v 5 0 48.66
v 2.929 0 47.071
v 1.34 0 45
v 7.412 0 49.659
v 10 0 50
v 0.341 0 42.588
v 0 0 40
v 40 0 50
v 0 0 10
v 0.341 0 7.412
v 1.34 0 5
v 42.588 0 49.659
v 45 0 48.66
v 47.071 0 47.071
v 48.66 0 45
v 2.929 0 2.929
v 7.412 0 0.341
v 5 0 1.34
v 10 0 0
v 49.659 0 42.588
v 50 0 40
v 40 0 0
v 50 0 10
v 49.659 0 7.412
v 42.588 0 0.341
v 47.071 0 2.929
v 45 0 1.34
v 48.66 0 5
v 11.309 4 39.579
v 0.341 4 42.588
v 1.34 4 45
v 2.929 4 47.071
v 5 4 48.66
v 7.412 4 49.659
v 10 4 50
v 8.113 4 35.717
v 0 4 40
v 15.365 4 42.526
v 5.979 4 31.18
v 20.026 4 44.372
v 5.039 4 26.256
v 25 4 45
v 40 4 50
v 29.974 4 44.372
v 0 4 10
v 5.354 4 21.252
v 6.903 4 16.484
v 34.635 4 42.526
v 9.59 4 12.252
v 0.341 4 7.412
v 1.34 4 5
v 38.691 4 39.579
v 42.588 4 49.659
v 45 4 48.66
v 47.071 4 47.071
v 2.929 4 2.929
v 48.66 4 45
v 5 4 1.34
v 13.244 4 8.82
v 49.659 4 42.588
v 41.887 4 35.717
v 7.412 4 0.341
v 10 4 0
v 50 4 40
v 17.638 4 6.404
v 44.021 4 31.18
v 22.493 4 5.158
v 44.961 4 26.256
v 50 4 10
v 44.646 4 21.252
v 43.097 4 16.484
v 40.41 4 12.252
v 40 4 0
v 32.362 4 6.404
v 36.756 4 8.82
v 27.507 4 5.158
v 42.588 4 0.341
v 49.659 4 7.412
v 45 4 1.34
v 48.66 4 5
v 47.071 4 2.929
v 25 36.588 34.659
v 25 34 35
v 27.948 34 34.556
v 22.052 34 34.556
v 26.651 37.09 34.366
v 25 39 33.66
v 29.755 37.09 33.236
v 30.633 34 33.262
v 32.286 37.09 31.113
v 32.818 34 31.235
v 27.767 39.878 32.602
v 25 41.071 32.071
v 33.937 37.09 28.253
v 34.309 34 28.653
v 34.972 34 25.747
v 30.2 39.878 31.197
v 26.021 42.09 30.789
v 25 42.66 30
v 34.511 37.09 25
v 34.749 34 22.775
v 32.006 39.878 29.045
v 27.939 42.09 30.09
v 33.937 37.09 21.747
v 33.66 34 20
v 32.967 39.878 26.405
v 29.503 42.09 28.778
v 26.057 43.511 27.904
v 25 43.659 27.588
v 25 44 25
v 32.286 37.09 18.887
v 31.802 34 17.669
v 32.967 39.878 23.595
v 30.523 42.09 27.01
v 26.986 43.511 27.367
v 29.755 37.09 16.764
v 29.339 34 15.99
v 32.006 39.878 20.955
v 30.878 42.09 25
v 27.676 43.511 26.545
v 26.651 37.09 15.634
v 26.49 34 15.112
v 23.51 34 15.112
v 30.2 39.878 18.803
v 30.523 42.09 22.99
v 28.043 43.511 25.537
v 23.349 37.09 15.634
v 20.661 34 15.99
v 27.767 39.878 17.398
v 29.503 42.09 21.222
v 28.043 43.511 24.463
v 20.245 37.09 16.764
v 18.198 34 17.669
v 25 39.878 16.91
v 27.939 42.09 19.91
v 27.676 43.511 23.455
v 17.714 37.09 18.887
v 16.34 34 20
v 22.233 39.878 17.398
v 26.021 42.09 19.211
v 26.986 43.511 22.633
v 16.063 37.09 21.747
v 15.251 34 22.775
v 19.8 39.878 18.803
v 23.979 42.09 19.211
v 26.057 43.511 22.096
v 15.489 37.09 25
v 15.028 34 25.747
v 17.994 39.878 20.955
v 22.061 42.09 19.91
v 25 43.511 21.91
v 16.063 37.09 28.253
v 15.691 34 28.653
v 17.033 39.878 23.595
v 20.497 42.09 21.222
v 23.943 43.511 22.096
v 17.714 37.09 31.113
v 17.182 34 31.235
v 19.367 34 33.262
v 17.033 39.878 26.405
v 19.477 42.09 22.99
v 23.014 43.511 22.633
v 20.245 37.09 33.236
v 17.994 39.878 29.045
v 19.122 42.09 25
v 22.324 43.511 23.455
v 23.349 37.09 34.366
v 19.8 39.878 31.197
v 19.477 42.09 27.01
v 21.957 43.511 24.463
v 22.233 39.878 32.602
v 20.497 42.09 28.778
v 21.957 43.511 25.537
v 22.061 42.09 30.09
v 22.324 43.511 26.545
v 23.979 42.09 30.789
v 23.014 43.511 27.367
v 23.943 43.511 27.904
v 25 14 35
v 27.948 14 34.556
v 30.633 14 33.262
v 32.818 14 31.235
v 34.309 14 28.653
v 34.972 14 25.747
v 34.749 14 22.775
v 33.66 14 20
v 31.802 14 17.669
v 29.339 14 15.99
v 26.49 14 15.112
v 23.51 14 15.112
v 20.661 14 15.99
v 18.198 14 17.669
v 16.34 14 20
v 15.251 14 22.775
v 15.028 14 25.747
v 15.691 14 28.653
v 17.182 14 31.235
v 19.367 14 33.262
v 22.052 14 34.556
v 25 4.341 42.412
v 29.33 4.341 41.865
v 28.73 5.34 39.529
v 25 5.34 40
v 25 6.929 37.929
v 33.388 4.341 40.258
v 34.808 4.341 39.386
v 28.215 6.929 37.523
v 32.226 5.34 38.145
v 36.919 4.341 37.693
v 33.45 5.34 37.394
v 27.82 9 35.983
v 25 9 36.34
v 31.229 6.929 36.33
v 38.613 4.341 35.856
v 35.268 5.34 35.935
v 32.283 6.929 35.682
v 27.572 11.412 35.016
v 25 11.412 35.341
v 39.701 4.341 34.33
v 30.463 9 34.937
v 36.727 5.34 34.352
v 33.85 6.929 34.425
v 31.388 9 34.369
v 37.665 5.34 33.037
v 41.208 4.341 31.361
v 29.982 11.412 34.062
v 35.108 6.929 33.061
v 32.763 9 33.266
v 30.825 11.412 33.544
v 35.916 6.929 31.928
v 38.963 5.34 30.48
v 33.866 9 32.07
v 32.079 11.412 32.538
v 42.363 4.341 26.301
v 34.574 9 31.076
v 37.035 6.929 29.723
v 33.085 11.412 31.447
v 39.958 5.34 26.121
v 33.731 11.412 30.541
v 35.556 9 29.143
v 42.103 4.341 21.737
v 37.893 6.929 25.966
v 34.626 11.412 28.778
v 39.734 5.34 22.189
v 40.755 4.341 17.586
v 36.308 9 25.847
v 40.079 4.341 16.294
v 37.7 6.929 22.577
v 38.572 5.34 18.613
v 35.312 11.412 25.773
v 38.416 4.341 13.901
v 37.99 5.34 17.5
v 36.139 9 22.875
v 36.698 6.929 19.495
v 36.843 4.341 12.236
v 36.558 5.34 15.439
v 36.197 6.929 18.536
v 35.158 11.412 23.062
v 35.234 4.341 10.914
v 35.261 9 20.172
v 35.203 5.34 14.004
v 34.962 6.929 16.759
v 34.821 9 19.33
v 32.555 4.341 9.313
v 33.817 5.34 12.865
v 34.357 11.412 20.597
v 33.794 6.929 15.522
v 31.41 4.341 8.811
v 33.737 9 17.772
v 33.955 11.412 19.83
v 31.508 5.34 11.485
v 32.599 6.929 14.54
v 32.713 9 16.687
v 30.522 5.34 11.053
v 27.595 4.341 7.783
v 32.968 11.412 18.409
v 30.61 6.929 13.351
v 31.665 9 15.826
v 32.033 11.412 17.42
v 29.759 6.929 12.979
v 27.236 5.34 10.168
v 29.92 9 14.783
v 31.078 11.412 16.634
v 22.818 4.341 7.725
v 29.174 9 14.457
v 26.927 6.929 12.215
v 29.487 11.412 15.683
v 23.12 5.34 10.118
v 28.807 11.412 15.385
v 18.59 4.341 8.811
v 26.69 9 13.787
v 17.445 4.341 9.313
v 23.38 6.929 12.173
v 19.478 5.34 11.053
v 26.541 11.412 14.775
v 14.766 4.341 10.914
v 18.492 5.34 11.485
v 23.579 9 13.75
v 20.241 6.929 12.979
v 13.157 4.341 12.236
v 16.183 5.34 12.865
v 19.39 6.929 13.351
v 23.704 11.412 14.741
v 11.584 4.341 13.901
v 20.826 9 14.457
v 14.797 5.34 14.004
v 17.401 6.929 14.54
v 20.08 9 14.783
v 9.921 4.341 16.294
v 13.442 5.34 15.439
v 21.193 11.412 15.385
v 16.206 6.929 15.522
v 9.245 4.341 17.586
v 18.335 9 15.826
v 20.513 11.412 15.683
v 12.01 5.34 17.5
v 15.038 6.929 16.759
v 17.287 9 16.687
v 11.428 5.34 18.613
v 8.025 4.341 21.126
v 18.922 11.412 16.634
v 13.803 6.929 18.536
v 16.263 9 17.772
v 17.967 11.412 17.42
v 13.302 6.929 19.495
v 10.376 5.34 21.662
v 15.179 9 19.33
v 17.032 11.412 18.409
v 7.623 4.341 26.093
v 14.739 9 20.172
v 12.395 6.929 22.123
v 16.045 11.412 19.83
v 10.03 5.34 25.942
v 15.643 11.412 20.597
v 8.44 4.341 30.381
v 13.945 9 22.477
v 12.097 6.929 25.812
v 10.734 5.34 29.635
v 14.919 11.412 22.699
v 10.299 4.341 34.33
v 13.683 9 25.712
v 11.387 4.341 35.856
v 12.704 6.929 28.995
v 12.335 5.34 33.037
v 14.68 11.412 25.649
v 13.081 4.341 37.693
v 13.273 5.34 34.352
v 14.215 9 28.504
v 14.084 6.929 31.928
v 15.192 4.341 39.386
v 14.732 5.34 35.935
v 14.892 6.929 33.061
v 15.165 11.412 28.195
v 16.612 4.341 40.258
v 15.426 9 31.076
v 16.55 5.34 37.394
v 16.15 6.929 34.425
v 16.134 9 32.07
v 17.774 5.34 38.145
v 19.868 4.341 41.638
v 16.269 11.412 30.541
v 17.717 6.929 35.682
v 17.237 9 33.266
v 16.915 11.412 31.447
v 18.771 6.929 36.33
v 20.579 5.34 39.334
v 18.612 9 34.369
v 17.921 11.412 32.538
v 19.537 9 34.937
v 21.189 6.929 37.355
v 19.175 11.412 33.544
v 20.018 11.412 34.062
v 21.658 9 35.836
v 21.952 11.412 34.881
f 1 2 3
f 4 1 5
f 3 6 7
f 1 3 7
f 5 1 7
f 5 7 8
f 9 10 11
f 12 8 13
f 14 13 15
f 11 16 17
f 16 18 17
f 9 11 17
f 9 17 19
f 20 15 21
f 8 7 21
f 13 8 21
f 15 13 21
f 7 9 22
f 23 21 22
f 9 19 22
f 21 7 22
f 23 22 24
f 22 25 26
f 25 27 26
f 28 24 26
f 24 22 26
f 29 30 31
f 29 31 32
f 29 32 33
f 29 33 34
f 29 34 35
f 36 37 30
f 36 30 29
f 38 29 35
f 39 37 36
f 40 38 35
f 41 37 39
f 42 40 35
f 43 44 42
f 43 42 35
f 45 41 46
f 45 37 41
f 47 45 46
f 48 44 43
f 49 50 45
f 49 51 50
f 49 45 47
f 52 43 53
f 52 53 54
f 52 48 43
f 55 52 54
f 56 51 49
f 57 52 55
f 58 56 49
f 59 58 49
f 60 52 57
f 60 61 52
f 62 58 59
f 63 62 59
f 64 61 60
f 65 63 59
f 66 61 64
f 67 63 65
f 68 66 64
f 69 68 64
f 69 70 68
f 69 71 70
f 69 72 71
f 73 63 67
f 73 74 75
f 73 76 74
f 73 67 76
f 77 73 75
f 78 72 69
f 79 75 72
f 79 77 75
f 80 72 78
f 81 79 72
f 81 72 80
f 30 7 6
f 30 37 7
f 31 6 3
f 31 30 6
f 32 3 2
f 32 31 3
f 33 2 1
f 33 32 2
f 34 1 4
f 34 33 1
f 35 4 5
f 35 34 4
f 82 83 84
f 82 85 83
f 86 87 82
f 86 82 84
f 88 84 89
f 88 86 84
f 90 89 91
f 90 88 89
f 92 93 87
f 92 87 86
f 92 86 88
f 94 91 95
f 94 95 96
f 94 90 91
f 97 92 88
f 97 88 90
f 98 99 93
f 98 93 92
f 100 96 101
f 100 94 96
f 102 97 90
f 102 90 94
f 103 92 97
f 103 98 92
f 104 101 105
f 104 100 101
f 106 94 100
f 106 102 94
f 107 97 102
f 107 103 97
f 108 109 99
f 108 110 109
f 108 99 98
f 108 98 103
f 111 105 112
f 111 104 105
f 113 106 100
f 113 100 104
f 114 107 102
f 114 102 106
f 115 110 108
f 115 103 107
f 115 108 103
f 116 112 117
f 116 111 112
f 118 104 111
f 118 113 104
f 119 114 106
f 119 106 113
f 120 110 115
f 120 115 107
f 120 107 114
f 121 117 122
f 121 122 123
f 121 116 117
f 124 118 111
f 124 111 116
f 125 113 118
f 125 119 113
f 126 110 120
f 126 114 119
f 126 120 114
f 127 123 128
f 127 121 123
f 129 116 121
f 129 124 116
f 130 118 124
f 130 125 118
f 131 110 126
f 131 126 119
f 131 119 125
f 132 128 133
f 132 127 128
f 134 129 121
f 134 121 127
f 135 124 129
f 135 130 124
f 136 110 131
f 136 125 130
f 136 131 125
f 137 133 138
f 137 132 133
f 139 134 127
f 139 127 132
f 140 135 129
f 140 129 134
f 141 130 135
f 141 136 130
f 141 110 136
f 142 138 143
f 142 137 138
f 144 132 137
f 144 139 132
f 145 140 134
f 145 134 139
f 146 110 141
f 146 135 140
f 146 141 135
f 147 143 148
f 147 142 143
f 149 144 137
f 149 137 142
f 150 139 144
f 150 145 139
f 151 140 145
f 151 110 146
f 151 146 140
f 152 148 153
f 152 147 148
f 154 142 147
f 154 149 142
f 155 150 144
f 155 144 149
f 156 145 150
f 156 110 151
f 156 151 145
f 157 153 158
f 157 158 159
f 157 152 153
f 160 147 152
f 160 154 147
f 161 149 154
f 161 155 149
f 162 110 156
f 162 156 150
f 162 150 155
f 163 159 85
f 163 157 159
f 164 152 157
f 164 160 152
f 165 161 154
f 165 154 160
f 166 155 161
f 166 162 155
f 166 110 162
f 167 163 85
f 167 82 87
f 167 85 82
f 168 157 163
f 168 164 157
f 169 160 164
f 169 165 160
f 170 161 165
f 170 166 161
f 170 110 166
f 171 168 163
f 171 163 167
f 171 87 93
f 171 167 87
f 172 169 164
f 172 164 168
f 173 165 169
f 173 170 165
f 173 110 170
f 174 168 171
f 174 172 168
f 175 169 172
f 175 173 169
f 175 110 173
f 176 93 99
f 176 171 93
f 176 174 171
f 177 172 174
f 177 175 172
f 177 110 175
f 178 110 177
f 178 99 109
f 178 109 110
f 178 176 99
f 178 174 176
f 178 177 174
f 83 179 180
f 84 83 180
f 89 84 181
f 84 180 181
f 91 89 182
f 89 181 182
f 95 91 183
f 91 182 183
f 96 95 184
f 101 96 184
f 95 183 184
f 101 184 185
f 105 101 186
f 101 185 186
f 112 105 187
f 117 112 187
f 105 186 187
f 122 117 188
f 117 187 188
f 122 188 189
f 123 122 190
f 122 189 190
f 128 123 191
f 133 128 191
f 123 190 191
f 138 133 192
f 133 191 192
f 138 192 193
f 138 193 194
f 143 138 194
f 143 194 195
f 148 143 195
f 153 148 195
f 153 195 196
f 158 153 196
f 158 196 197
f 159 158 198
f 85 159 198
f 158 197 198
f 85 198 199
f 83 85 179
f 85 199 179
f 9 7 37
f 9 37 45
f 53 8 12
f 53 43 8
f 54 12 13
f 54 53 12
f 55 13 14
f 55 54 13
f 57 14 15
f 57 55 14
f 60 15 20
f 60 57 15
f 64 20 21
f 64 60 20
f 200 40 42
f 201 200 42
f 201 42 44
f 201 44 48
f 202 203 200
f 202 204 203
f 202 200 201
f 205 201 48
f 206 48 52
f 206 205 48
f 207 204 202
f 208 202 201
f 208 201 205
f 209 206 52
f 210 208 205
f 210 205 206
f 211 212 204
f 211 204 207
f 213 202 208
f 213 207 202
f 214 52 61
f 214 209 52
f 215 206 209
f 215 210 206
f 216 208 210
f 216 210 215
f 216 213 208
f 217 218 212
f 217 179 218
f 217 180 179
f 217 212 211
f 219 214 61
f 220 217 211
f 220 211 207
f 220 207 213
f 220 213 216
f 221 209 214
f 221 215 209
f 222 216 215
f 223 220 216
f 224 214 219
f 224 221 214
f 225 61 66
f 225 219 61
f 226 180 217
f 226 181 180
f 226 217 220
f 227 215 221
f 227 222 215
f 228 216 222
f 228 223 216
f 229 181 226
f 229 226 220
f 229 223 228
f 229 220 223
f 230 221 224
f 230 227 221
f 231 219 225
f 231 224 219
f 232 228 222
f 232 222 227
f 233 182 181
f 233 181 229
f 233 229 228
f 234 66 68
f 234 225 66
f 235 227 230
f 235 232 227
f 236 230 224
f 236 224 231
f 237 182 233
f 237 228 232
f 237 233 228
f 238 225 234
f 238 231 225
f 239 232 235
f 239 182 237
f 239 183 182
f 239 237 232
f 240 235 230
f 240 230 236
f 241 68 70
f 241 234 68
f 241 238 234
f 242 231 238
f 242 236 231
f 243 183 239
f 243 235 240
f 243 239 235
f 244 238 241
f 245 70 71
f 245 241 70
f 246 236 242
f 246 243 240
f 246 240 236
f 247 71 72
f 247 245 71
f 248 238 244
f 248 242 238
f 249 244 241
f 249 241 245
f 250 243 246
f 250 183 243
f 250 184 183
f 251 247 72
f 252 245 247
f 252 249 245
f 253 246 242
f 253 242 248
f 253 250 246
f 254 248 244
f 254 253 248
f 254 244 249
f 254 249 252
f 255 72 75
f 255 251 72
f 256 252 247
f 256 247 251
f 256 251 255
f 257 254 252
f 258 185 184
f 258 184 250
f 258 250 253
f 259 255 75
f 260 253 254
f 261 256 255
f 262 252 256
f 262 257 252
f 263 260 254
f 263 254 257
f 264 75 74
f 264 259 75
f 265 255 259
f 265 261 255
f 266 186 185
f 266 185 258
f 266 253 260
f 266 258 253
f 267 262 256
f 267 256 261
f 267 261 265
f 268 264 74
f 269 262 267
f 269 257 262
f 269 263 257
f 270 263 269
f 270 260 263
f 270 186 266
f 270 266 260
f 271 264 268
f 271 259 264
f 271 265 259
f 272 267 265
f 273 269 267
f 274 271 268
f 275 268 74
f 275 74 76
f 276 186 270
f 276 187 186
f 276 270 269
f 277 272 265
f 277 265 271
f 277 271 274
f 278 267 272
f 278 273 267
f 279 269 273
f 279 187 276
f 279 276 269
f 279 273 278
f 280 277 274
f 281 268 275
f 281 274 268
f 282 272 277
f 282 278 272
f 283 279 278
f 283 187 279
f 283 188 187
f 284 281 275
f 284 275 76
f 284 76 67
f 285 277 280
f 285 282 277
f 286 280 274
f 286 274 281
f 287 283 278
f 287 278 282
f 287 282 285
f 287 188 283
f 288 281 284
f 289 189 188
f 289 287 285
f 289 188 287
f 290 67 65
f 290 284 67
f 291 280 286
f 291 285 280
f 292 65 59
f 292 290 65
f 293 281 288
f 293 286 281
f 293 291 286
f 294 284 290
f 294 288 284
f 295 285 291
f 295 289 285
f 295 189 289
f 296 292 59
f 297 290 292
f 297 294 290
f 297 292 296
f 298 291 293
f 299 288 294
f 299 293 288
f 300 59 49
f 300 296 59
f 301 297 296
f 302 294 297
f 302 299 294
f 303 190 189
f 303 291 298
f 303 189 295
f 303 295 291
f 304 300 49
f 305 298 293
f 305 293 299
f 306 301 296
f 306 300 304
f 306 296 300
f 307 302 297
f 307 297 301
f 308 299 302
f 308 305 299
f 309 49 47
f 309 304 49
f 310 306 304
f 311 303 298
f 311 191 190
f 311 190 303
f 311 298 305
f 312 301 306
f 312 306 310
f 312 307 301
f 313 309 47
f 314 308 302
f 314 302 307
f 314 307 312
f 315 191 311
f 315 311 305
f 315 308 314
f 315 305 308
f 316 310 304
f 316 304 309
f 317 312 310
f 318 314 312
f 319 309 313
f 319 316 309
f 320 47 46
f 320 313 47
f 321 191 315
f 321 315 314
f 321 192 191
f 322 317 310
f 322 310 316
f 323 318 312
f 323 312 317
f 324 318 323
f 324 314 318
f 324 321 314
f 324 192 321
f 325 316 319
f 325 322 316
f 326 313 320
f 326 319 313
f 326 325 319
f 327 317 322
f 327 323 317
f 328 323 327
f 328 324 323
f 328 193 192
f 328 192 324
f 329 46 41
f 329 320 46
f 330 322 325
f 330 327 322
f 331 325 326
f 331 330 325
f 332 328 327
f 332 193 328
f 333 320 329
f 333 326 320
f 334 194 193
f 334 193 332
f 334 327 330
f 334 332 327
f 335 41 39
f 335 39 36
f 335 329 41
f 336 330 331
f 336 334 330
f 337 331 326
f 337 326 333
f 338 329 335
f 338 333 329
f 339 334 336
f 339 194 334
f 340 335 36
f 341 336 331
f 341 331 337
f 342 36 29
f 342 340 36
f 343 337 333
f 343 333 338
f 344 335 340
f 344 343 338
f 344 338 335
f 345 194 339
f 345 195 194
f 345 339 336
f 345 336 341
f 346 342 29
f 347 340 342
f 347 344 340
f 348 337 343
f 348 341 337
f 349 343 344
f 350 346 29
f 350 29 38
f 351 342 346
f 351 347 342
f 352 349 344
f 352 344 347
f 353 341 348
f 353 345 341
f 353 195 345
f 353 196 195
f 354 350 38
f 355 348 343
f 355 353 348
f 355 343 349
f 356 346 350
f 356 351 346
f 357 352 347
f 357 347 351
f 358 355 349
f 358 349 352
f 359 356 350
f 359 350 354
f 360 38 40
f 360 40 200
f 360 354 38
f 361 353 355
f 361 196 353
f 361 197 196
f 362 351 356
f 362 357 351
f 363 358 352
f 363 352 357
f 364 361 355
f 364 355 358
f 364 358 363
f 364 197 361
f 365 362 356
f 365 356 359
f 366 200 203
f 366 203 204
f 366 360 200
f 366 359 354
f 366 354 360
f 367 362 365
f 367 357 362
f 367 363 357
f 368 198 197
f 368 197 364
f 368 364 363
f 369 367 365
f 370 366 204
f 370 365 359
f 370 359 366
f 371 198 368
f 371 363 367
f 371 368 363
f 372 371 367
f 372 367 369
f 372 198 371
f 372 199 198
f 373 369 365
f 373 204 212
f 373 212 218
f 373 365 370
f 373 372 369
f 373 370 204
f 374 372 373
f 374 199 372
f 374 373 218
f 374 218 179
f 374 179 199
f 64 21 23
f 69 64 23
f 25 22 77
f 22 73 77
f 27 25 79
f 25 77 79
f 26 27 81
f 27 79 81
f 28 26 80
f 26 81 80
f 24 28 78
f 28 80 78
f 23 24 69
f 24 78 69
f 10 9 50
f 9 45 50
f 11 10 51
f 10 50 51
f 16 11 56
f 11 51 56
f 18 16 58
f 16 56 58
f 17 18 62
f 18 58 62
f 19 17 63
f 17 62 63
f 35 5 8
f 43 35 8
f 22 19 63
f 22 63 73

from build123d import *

# Parameters (mm, degrees)
SKETCH_1_W      = 50
SKETCH_1_H      = 50
EXTRUDE_1_DEPTH = 4
SKETCH_2_R      = 10
EXTRUDE_2_DEPTH = 40
FILLET_1_R      = 10
FILLET_2_R      = 10
FILLET_3_R      = 10


with BuildPart() as part:
    # 草图1 → 凸台-拉伸1 (new body)
    with BuildSketch(Plane(origin=(0, 0, 0), x_dir=(1, 0, 0), z_dir=(0, 1, 0))):
        with Locations((25, -25)):
            Rectangle(SKETCH_1_W, SKETCH_1_H)
    extrude(amount=EXTRUDE_1_DEPTH)

    # 草图2 → 凸台-拉伸2 (add)
    with BuildSketch(Plane(origin=(0, 4, 0), x_dir=(1, 0, 0), z_dir=(0, 1, 0))):
        with Locations(Location((25, -25, 0), (0, 0, 270))):
            Circle(SKETCH_2_R)
    extrude(amount=EXTRUDE_2_DEPTH)

    # 圆角1
    fillet_1_edges = [part.edges().sort_by_distance(p)[0] for p in [
        (25, 4, 15),
    ]]
    fillet(fillet_1_edges, radius=FILLET_1_R)

    # 圆角2
    fillet_2_edges = [part.edges().sort_by_distance(p)[0] for p in [
        (25, 44, 15),
    ]]
    fillet(fillet_2_edges, radius=FILLET_2_R)

    # 圆角3
    fillet_3_edges = [part.edges().sort_by_distance(p)[0] for p in [
        (0, 2, 0),
        (50, 2, 0),
        (50, 2, 50),
        (0, 2, 50),
    ]]
    fillet(fillet_3_edges, radius=FILLET_3_R)


solid = part.part
